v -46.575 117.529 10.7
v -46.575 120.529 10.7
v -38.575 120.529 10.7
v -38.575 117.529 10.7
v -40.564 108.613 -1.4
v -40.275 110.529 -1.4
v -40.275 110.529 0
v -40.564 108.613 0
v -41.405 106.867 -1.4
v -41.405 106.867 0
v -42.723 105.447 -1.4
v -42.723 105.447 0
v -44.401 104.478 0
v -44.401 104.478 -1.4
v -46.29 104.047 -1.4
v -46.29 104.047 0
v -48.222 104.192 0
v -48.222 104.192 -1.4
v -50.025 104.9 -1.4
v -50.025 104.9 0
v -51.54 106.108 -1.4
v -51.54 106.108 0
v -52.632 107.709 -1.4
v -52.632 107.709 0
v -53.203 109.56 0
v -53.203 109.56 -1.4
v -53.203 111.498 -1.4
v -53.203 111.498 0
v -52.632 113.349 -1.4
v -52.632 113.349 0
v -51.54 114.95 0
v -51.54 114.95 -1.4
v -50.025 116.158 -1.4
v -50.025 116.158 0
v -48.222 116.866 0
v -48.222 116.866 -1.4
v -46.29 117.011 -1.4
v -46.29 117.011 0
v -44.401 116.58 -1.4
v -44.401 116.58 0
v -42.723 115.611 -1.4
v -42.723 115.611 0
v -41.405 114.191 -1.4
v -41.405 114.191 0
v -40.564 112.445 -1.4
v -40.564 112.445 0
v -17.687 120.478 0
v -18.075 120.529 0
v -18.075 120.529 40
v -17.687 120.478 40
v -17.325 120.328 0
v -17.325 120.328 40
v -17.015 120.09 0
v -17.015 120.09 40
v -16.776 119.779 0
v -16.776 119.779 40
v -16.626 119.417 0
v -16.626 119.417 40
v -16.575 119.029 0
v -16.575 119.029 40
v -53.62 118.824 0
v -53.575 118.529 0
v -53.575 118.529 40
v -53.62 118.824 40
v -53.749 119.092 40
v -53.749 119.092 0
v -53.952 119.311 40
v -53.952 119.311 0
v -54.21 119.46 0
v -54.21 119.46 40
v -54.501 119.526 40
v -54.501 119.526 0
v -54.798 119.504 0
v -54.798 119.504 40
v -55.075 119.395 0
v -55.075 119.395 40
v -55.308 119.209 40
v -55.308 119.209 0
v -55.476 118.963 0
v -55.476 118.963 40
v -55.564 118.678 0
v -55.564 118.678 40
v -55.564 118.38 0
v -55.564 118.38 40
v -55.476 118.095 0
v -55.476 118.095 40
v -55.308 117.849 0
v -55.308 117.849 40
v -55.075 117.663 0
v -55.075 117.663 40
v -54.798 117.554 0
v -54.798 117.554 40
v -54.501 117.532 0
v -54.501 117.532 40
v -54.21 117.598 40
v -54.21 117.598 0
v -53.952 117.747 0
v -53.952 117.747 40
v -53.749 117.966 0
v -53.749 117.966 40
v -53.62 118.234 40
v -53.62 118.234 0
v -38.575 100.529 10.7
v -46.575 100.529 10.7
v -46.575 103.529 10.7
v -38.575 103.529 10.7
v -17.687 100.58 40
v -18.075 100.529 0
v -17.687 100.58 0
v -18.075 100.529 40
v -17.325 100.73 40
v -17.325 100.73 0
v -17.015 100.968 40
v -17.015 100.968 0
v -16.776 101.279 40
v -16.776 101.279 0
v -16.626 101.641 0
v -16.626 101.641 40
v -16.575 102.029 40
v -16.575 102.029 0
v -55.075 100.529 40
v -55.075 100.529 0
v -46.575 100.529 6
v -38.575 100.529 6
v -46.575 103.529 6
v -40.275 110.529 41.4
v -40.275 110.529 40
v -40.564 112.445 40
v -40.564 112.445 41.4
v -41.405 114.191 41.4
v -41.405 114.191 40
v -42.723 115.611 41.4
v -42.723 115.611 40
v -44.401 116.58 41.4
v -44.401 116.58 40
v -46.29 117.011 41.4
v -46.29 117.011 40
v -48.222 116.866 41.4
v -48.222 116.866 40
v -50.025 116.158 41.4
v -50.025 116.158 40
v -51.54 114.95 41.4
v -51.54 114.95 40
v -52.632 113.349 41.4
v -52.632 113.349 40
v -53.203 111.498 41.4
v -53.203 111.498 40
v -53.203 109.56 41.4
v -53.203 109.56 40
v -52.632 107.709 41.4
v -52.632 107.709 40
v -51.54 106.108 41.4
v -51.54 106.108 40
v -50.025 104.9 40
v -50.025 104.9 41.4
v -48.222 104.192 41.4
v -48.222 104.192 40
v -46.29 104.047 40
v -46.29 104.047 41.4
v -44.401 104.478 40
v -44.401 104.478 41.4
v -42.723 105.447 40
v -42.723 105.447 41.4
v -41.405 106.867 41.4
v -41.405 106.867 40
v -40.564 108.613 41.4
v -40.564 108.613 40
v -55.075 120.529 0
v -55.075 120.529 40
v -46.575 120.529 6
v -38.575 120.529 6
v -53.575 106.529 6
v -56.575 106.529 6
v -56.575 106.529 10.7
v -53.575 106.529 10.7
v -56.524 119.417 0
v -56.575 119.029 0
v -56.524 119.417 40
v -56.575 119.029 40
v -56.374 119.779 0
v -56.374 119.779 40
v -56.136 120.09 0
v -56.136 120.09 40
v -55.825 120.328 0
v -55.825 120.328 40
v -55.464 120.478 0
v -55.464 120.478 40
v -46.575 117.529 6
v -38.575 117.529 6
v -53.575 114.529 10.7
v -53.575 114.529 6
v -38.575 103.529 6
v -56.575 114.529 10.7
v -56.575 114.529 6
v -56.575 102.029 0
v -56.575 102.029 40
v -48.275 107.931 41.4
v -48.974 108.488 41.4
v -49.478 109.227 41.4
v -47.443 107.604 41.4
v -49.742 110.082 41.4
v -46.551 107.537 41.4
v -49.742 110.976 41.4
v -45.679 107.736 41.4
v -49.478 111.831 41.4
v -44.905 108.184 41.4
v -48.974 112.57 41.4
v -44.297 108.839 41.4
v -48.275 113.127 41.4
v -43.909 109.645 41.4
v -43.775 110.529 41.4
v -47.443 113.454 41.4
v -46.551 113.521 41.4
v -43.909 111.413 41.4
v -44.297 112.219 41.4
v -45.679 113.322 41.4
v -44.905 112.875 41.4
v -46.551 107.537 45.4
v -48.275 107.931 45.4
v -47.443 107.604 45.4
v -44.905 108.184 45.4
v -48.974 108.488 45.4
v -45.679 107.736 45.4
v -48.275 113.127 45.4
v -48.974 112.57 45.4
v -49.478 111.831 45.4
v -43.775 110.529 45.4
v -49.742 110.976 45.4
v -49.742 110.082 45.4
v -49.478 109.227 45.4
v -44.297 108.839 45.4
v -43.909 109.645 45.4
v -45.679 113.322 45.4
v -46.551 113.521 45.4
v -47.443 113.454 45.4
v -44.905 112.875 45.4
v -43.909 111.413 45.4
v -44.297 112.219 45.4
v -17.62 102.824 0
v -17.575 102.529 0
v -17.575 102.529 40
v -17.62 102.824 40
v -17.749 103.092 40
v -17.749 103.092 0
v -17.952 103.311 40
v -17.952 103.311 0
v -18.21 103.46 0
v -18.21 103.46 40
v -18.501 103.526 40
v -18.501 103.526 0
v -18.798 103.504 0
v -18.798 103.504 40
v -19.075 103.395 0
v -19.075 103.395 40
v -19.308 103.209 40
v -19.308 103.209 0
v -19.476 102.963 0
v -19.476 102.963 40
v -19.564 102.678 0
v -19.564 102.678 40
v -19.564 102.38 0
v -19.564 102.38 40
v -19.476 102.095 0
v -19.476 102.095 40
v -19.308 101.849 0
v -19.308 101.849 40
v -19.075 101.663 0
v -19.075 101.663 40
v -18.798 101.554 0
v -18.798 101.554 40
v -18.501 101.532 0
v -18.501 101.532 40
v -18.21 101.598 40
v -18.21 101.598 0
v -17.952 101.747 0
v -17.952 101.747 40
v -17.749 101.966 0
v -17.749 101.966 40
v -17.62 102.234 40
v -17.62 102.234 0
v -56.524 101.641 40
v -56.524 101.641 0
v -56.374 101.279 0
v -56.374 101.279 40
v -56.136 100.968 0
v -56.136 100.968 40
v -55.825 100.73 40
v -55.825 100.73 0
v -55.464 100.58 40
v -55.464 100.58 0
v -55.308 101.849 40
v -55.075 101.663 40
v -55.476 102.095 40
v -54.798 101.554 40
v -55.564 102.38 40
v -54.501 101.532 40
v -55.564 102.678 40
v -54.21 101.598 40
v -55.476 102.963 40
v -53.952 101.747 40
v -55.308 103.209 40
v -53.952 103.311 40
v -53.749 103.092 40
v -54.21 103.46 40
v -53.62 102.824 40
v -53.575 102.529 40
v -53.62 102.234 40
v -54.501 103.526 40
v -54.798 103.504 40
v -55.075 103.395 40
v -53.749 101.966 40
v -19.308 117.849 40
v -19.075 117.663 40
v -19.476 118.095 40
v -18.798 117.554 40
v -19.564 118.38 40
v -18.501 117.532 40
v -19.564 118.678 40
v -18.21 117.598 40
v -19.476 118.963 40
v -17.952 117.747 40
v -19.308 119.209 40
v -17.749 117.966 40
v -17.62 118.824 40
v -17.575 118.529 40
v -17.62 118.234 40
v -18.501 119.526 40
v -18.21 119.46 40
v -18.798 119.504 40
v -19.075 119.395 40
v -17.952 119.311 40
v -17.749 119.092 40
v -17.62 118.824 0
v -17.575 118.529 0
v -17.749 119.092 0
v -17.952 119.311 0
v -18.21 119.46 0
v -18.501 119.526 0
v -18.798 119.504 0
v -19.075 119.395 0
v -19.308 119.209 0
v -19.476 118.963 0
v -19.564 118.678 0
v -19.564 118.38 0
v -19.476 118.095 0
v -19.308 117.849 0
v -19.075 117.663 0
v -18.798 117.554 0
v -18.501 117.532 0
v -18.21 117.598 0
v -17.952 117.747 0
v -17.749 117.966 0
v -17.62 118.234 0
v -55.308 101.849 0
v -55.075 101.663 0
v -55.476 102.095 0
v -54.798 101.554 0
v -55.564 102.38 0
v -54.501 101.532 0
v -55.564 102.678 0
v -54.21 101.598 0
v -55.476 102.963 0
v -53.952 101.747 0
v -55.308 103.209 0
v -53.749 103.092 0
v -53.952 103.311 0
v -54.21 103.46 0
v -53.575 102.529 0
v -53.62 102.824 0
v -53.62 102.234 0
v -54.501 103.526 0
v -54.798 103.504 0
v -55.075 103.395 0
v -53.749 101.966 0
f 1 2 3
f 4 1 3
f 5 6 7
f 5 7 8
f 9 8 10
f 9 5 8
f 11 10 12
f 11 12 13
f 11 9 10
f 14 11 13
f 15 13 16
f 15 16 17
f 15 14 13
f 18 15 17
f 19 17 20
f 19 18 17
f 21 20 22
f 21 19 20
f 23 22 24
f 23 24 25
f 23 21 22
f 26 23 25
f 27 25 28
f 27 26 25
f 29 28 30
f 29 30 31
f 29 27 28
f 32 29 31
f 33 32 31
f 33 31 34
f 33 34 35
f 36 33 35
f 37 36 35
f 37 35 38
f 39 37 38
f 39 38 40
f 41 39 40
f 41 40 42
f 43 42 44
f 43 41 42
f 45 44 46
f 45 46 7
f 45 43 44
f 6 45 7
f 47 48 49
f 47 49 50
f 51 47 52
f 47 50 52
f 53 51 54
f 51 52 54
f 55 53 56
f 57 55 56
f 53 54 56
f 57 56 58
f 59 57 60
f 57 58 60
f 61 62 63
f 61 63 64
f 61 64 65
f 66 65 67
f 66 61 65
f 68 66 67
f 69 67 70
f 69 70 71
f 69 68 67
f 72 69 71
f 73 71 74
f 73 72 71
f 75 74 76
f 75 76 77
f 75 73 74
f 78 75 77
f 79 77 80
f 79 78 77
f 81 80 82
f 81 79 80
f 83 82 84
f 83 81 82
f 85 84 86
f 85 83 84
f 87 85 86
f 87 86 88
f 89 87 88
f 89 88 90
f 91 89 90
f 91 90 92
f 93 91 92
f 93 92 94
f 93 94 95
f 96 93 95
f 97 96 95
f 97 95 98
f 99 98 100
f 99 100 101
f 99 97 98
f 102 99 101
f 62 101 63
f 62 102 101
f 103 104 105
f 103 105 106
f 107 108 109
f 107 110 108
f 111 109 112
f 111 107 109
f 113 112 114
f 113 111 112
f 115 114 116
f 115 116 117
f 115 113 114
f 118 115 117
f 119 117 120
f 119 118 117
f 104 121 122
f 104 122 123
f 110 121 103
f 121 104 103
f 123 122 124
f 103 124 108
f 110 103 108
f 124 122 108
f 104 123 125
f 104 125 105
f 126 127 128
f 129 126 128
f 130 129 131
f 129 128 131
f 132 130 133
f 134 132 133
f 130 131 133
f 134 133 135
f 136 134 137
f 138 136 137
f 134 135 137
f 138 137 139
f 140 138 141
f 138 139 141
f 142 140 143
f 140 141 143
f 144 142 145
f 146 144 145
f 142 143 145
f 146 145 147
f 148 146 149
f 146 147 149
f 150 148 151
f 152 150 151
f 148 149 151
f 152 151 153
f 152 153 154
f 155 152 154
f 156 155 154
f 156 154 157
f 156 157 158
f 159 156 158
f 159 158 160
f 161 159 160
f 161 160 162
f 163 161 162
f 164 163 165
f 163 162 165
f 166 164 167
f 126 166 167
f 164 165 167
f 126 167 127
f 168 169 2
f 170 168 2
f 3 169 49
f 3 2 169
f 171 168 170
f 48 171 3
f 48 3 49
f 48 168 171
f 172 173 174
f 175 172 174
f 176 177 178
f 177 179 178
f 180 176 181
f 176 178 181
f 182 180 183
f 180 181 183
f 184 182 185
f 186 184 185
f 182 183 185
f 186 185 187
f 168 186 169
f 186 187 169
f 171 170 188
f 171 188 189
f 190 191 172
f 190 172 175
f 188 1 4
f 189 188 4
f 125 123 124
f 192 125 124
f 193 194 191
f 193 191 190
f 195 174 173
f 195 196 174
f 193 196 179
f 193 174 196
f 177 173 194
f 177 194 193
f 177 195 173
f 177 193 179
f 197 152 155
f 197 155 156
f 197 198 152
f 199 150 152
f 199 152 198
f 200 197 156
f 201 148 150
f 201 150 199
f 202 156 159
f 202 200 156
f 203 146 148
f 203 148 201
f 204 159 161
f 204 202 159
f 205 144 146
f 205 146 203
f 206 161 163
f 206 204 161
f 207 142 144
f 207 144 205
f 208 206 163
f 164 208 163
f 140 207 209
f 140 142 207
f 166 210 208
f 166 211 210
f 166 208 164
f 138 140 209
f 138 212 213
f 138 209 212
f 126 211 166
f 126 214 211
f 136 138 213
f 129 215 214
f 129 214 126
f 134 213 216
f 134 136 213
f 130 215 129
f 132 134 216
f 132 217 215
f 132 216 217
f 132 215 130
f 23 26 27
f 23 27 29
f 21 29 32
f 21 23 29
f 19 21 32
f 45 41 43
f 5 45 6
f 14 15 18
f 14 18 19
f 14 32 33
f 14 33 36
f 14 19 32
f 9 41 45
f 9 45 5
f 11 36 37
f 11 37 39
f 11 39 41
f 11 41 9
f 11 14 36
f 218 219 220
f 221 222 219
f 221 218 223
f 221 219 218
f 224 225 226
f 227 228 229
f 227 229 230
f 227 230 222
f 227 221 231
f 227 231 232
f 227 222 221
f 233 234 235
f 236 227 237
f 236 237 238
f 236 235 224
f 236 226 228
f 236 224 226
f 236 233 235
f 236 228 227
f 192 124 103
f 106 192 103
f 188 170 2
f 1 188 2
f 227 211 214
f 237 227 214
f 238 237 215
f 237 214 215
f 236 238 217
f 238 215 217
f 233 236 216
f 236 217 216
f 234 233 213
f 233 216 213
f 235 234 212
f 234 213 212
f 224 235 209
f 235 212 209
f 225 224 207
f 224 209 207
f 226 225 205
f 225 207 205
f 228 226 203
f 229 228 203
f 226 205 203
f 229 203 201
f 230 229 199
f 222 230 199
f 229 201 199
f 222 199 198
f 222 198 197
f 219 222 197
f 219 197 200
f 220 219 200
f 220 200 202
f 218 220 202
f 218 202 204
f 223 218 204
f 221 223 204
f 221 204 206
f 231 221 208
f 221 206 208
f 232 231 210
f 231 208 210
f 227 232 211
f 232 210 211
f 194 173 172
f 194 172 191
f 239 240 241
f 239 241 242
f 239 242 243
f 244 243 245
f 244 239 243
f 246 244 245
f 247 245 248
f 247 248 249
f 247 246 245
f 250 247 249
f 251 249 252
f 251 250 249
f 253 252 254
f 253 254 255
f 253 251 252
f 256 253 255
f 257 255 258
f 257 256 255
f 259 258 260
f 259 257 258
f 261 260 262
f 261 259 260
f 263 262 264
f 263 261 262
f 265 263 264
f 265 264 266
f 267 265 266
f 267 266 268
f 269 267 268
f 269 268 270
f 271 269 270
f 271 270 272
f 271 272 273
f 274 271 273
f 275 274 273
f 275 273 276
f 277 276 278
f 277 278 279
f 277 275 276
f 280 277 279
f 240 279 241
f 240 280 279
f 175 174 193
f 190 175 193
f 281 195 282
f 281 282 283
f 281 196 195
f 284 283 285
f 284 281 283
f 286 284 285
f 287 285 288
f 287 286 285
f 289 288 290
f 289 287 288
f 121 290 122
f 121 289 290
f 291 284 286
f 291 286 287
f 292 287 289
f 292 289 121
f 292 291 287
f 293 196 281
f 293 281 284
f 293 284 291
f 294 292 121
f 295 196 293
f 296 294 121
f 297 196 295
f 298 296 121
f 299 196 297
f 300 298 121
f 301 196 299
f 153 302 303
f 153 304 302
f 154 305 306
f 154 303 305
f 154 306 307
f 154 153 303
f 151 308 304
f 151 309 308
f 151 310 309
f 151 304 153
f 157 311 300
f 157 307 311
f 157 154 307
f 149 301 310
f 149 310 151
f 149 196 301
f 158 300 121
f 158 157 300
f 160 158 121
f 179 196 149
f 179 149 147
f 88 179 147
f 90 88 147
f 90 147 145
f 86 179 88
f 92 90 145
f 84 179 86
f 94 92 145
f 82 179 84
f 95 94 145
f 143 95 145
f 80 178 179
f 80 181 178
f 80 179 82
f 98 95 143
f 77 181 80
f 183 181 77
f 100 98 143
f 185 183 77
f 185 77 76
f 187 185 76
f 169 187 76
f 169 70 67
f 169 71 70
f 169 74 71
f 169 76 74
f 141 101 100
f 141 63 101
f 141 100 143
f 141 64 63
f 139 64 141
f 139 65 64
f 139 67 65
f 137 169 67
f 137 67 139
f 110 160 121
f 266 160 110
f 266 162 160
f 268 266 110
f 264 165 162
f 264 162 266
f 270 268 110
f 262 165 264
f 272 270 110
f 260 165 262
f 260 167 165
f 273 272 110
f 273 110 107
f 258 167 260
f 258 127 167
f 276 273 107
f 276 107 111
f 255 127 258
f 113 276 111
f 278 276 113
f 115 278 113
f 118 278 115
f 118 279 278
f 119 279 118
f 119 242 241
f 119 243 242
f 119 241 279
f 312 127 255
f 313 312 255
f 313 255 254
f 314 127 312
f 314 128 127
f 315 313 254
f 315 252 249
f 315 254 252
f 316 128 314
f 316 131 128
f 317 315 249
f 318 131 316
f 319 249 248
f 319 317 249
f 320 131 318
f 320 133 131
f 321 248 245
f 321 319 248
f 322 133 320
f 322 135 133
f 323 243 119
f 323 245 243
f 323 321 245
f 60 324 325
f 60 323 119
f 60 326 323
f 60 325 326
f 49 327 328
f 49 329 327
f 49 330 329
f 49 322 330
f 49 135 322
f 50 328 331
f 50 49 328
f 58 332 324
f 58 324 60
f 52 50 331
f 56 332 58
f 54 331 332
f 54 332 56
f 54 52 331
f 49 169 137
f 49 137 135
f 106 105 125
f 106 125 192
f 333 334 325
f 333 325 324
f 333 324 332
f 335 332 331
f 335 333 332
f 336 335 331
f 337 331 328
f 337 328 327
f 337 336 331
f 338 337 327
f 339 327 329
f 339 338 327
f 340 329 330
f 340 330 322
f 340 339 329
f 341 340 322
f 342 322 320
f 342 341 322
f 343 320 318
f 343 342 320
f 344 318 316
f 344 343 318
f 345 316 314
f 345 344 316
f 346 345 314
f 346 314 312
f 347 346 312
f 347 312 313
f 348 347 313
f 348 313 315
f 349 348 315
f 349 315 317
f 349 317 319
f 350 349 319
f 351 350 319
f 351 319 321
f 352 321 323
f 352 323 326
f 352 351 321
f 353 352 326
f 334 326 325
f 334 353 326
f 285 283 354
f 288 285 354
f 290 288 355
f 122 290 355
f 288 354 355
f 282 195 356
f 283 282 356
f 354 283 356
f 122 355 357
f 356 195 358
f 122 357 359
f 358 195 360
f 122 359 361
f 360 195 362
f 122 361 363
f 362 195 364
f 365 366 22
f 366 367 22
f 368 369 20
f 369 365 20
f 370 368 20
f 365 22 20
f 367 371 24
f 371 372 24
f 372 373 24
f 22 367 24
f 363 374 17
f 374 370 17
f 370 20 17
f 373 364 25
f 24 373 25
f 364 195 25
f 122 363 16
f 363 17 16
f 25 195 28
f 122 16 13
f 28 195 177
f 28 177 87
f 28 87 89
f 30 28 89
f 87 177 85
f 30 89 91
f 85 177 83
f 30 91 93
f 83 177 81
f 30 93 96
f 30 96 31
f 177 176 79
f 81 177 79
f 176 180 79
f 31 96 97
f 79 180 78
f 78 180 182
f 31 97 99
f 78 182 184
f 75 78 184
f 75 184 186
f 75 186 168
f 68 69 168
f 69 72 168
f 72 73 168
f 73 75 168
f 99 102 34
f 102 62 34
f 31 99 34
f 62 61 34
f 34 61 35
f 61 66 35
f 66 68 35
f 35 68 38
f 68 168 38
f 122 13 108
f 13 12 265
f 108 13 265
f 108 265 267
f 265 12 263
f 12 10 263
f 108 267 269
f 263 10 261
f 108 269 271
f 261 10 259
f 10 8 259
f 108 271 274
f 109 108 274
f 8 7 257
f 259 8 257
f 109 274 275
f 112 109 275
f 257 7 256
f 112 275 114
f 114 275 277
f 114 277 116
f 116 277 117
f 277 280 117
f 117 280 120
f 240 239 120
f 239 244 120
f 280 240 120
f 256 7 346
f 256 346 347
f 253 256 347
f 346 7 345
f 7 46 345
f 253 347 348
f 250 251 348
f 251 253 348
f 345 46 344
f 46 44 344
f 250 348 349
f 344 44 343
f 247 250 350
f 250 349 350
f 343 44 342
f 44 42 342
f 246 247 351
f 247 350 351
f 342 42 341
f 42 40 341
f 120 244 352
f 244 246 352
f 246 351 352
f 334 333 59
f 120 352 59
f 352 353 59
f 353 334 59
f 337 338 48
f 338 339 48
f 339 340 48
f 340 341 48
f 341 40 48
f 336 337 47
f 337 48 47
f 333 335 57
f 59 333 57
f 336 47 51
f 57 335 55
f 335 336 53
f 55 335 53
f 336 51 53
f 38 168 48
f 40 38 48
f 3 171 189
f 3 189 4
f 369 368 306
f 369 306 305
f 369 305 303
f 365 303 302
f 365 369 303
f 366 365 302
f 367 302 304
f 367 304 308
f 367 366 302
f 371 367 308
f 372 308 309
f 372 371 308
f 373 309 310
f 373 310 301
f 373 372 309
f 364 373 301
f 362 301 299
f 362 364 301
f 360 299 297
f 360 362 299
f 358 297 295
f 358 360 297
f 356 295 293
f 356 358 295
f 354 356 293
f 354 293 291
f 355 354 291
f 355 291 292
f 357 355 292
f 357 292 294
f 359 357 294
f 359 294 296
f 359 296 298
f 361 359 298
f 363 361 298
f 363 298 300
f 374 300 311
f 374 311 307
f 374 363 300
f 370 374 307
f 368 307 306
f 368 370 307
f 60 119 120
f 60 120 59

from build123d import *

# Parameters (mm, degrees)
SKETCH_1_W          = 40
SKETCH_1_H          = 20
SKETCH_1_R          = 1
EXTRUDE_1_DEPTH     = 40
FILLET_1_R          = 1.5
SKETCH_3_R          = 6.5
EXTRUDE_3_DEPTH     = 1.4
EXTRUDE_START       = 1.4
SKETCH_4_R          = 6.5
EXTRUDE_4_DEPTH     = 1.4
SKETCH_6_R          = 3
EXTRUDE_6_DEPTH     = 4
SKETCH_7_W          = 8
SKETCH_7_H          = 4.7
CUT_EXTRUDE_1_DEPTH = 3
SKETCH_8_W          = 4.7
SKETCH_8_H          = 8
CUT_EXTRUDE_2_DEPTH = 3


with BuildPart() as part:
    # 草图1 → 凸台-拉伸1 (new body)
    with BuildSketch(Plane.XY):
        with Locations((-36.575311459, 110.529011993)):
            Rectangle(SKETCH_1_W, SKETCH_1_H)
        with Locations((-54.575311459, 118.529011993)):
            Circle(SKETCH_1_R, mode=Mode.SUBTRACT)
        with Locations((-54.575311459, 102.529011993)):
            Circle(SKETCH_1_R, mode=Mode.SUBTRACT)
        with Locations((-18.575311459, 102.529011993)):
            Circle(SKETCH_1_R, mode=Mode.SUBTRACT)
        with Locations((-18.575311459, 118.529011993)):
            Circle(SKETCH_1_R, mode=Mode.SUBTRACT)
    extrude(amount=EXTRUDE_1_DEPTH)

    # 圆角1
    fillet_1_edges = [part.edges().sort_by_distance(p)[0] for p in [
        (-16.575311459, 100.529011993, 20),
        (-56.575311459, 100.529011993, 20),
        (-56.575311459, 120.529011993, 20),
        (-16.575311459, 120.529011993, 20),
    ]]
    fillet(fillet_1_edges, radius=FILLET_1_R)

    # 草图3 → 凸台-拉伸3 (add)
    with BuildSketch(Plane.XY.offset(40)):
        with Locations((-46.775311459, 110.529011993)):
            Circle(SKETCH_3_R)
    extrude(amount=EXTRUDE_3_DEPTH)

    # 草图4 → 凸台-拉伸4 (add)
    with BuildSketch(Plane(origin=(0, 0, 0), x_dir=(-1, 0, 0), z_dir=(0, 0, -1)).offset(EXTRUDE_START)):
        with Locations(Location((46.775311459, 110.529011993, 0), (0, 0, 180))):
            Circle(SKETCH_4_R)
    extrude(amount=-EXTRUDE_4_DEPTH)

    # 草图6 → 凸台-拉伸6 (add)
    with BuildSketch(Plane.XY.offset(41.4)):
        with Locations((-46.775311459, 110.529011993)):
            Circle(SKETCH_6_R)
    extrude(amount=EXTRUDE_6_DEPTH)

    # 草图7 → 切除-拉伸1 (cut)
    with BuildSketch(Plane.XZ.offset(-100.529011993)):
        with Locations((-42.575311459, 8.35)):
            Rectangle(SKETCH_7_W, SKETCH_7_H)
    cut_extrude_1 = extrude(amount=-CUT_EXTRUDE_1_DEPTH, mode=Mode.SUBTRACT)

    # 镜向1: 切除-拉伸1 across plane
    add(cut_extrude_1.mirror(Plane(origin=(0, 110.529011993, 0), x_dir=(0, 0, 1), z_dir=(0, -1, 0))), mode=Mode.SUBTRACT)

    # 草图8 → 切除-拉伸2 (cut)
    with BuildSketch(Plane.ZY.offset(56.575311459)):
        with Locations((8.35, 110.529011993)):
            Rectangle(SKETCH_8_W, SKETCH_8_H)
    extrude(amount=-CUT_EXTRUDE_2_DEPTH, mode=Mode.SUBTRACT)


solid = part.part
